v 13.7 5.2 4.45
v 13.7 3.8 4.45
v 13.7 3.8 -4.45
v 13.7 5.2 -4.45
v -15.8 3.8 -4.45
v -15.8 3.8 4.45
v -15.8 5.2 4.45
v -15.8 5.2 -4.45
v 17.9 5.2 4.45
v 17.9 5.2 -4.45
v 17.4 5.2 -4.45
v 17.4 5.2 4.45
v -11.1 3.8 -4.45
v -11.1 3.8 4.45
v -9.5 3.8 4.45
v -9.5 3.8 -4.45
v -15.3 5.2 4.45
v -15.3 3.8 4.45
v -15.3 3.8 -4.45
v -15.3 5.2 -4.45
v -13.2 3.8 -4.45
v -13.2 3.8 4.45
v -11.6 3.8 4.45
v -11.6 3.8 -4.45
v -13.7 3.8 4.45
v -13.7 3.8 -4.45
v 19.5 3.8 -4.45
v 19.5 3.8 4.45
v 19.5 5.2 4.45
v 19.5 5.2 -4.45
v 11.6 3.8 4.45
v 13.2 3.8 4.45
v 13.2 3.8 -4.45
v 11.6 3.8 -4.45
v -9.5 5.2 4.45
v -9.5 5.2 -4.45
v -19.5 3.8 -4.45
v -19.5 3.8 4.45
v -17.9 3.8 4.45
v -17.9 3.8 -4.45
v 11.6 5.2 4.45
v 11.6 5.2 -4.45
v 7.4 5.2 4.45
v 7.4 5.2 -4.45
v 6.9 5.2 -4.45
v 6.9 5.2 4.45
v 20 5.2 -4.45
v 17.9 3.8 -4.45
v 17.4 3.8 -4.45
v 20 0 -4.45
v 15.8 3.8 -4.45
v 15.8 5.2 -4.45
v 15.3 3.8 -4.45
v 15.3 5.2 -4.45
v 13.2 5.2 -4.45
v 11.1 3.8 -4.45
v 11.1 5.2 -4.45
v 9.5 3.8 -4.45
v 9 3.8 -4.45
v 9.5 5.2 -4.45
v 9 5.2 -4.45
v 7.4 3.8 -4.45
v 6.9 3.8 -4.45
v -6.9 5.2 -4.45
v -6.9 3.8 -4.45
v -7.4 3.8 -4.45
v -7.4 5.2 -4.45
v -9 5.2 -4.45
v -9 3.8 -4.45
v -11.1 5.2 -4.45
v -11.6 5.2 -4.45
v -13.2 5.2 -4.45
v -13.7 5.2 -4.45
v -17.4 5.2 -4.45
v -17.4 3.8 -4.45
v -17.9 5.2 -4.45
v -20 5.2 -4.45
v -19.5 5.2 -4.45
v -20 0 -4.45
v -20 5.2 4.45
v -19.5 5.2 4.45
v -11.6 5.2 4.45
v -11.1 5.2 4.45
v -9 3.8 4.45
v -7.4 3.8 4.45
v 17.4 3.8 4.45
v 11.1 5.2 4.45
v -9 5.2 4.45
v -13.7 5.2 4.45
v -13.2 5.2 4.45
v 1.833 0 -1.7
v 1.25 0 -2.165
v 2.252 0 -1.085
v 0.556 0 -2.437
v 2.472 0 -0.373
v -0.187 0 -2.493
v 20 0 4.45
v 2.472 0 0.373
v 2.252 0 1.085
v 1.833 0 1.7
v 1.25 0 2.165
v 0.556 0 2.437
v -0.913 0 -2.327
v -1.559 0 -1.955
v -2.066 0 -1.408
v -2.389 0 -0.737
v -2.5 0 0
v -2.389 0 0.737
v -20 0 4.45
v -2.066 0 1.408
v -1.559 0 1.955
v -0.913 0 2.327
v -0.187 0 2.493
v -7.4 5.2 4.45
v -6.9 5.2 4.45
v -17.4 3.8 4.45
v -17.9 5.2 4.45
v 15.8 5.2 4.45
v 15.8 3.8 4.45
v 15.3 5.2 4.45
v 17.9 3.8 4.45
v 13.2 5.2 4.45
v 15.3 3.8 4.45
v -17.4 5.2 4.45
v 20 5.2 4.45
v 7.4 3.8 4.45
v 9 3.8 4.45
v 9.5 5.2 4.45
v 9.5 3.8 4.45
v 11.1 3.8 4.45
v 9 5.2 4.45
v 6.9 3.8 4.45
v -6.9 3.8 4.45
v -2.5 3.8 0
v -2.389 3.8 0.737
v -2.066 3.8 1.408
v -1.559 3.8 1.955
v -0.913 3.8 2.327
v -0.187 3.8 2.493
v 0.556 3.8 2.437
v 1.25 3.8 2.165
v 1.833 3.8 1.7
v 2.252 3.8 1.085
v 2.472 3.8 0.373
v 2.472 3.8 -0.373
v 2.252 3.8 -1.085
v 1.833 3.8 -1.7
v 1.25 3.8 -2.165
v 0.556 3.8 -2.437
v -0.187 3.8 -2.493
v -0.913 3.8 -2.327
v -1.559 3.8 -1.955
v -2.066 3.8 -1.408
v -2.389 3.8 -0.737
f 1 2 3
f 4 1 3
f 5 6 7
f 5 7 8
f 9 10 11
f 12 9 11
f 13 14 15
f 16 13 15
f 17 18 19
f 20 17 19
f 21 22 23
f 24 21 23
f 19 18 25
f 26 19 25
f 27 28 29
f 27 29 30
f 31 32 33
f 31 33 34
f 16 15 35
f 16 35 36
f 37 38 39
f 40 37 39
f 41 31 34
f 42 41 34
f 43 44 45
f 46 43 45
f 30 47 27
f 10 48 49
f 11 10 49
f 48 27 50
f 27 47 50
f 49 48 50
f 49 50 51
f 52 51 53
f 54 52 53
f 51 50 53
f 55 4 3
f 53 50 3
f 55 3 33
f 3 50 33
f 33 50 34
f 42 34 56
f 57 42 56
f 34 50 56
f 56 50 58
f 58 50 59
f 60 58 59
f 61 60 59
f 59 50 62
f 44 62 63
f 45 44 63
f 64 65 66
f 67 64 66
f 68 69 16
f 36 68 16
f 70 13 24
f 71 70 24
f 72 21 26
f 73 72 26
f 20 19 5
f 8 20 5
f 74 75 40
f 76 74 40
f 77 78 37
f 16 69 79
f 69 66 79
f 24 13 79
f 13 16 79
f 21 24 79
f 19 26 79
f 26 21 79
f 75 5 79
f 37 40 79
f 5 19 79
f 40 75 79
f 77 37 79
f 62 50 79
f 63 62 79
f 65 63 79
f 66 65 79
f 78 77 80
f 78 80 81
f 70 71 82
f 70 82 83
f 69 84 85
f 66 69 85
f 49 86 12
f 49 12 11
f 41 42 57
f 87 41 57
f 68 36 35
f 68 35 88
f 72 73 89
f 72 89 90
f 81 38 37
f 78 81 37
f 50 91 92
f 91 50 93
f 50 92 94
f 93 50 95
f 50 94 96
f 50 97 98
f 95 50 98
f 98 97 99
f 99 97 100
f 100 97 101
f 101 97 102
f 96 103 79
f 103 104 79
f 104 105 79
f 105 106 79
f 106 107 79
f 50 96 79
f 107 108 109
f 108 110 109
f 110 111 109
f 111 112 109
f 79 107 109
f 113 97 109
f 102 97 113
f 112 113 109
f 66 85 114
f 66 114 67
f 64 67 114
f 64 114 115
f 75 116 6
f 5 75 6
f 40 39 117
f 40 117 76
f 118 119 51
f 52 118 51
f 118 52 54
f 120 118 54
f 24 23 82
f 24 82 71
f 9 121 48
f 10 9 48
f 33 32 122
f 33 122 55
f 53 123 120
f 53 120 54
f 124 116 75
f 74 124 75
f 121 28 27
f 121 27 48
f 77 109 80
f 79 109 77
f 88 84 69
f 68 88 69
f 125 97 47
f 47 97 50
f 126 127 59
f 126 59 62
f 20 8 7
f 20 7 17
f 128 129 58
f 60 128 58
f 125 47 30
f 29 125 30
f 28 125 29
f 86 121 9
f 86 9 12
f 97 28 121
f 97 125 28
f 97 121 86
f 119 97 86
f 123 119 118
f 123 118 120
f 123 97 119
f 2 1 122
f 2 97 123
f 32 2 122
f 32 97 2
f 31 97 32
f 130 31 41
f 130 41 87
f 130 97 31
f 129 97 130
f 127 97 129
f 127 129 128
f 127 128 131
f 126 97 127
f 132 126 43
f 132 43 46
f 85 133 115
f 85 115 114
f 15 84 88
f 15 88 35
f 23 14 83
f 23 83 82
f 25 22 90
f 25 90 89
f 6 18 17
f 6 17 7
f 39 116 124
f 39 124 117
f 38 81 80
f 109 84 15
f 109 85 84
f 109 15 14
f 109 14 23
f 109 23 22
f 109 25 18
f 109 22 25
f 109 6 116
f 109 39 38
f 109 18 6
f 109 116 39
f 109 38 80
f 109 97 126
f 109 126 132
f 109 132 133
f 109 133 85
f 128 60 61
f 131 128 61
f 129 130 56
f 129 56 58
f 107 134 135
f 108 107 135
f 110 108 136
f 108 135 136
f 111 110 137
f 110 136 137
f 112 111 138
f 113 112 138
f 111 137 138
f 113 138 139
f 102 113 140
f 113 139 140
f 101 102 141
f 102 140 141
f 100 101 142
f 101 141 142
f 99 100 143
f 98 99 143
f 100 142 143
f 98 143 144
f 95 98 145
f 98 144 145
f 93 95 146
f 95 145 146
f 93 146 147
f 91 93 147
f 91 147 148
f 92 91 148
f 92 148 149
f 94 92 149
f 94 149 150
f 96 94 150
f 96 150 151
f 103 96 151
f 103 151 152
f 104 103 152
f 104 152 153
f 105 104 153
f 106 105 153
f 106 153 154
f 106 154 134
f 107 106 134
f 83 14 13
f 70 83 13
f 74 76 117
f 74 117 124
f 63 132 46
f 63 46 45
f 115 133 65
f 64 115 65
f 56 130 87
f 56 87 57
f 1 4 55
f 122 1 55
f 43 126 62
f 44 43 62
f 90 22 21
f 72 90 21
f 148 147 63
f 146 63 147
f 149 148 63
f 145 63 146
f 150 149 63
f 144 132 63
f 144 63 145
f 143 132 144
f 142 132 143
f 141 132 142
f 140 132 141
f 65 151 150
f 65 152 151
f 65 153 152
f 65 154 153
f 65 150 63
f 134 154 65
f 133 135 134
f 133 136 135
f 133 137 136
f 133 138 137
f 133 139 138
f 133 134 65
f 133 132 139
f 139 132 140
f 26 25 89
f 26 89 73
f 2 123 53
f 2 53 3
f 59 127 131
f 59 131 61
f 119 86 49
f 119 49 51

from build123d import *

# Parameters (mm, degrees)
SKETCH1_W           = 20
SKETCH1_H           = 3.8
BOSS_EXTRUDE1_DEPTH = 4.45
SKETCH2_W           = 0.5
SKETCH2_H           = 8.9
BOSS_EXTRUDE2_DEPTH = 1.4
LPATTERN1_COUNT     = 7
LPATTERN1_PITCH     = 2.1
SKETCH3_R           = 2.5
CUT_EXTRUDE1_DEPTH  = 21.838486029


with BuildPart() as part:
    # Sketch1 → Boss-Extrude1 (new, symmetric)
    with BuildSketch(Plane.XY):
        with Locations((-10, 1.9)):
            Rectangle(SKETCH1_W, SKETCH1_H)
    extrude(amount=BOSS_EXTRUDE1_DEPTH, both=True)

    # Sketch2 → Boss-Extrude2 (add)
    with BuildSketch(Plane(origin=(0, 3.8, 0), x_dir=(1, 0, 0), z_dir=(0, 1, 0))):
        with Locations((-19.75, 0)):
            Rectangle(SKETCH2_W, SKETCH2_H)
    boss_extrude2 = extrude(amount=BOSS_EXTRUDE2_DEPTH)

    # LPattern1: Boss-Extrude2 ×7
    with Locations(*[(i * LPATTERN1_PITCH, 0, 0) for i in range(1, LPATTERN1_COUNT)]):
        add(boss_extrude2)

    # Mirror1: part across plane


with BuildPart() as part_1:
    add(part.part)
    add(part.part.mirror(Plane(origin=(0, 0, 4.45), x_dir=(0, 0, 1), z_dir=(-1, 0, 0))))

    # Sketch3 → Cut-Extrude1 (cut, through all)
    with BuildSketch(Plane(origin=(0, 3.8, 0), x_dir=(1, 0, 0), z_dir=(0, 1, 0))):
        with Locations(Location((0, 0, 0), (0, 0, 180))):
            Circle(SKETCH3_R)
    extrude(amount=-CUT_EXTRUDE1_DEPTH, mode=Mode.SUBTRACT)


solid = part_1.part
